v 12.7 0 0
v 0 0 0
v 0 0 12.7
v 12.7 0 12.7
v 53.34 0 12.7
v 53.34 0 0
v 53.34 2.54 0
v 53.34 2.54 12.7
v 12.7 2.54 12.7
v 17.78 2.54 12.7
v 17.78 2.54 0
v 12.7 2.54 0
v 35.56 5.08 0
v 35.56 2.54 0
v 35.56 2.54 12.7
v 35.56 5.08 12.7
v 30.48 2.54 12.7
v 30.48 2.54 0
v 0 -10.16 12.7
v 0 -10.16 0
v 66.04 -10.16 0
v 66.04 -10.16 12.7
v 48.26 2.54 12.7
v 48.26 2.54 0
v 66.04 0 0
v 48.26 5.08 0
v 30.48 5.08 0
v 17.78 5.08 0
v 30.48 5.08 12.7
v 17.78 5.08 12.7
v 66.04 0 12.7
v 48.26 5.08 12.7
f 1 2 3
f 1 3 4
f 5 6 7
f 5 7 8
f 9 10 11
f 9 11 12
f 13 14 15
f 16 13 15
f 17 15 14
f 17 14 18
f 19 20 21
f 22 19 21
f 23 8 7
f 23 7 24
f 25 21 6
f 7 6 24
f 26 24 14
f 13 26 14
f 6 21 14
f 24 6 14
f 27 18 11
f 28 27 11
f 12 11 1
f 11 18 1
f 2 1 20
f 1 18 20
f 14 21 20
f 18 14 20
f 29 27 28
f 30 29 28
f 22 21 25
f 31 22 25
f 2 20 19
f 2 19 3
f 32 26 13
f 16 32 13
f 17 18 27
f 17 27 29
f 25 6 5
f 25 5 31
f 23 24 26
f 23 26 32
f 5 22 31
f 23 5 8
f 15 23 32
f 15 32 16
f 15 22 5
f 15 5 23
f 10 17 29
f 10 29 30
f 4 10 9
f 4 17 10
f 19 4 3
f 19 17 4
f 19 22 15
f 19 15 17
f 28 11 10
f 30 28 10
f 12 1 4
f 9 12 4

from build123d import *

# Parameters (mm, degrees)
F0_W     = 66.04
F0_H     = 10.16
F1_DEPTH = 12.7
F2_W     = 12.7
F2_H     = 12.7
F3_DEPTH = 5.08
F2_W_2   = 5.08
F4_DEPTH = 2.54


with BuildPart() as f1:
    # F0 (on Top) → F1 (new body)
    with BuildSketch(Plane.XY):
        with Locations((33.02, -5.08)):
            Rectangle(F0_W, F0_H)
    extrude(amount=F1_DEPTH)

    # F2 (on face) → F3 (join)
    with BuildSketch(Plane(origin=(0, 0, 0), x_dir=(-1, 0, 0), z_dir=(0, 1, 0))):
        with Locations((-24.13, 6.35)):
            Rectangle(F2_W, F2_H)
        with Locations((-41.91, 6.35)):
            Rectangle(F2_W, F2_H)
    extrude(amount=F3_DEPTH)

    # F2 (on face) → F4 (join)
    with BuildSketch(Plane(origin=(0, 0, 0), x_dir=(-1, 0, 0), z_dir=(0, 1, 0))):
        with Locations((-15.24, 6.35)):
            Rectangle(F2_W_2, F2_H)
        with Locations((-33.02, 6.35)):
            Rectangle(F2_W_2, F2_H)
        with Locations((-50.8, 6.35)):
            Rectangle(F2_W_2, F2_H)
    extrude(amount=F4_DEPTH)


solid = f1.part
